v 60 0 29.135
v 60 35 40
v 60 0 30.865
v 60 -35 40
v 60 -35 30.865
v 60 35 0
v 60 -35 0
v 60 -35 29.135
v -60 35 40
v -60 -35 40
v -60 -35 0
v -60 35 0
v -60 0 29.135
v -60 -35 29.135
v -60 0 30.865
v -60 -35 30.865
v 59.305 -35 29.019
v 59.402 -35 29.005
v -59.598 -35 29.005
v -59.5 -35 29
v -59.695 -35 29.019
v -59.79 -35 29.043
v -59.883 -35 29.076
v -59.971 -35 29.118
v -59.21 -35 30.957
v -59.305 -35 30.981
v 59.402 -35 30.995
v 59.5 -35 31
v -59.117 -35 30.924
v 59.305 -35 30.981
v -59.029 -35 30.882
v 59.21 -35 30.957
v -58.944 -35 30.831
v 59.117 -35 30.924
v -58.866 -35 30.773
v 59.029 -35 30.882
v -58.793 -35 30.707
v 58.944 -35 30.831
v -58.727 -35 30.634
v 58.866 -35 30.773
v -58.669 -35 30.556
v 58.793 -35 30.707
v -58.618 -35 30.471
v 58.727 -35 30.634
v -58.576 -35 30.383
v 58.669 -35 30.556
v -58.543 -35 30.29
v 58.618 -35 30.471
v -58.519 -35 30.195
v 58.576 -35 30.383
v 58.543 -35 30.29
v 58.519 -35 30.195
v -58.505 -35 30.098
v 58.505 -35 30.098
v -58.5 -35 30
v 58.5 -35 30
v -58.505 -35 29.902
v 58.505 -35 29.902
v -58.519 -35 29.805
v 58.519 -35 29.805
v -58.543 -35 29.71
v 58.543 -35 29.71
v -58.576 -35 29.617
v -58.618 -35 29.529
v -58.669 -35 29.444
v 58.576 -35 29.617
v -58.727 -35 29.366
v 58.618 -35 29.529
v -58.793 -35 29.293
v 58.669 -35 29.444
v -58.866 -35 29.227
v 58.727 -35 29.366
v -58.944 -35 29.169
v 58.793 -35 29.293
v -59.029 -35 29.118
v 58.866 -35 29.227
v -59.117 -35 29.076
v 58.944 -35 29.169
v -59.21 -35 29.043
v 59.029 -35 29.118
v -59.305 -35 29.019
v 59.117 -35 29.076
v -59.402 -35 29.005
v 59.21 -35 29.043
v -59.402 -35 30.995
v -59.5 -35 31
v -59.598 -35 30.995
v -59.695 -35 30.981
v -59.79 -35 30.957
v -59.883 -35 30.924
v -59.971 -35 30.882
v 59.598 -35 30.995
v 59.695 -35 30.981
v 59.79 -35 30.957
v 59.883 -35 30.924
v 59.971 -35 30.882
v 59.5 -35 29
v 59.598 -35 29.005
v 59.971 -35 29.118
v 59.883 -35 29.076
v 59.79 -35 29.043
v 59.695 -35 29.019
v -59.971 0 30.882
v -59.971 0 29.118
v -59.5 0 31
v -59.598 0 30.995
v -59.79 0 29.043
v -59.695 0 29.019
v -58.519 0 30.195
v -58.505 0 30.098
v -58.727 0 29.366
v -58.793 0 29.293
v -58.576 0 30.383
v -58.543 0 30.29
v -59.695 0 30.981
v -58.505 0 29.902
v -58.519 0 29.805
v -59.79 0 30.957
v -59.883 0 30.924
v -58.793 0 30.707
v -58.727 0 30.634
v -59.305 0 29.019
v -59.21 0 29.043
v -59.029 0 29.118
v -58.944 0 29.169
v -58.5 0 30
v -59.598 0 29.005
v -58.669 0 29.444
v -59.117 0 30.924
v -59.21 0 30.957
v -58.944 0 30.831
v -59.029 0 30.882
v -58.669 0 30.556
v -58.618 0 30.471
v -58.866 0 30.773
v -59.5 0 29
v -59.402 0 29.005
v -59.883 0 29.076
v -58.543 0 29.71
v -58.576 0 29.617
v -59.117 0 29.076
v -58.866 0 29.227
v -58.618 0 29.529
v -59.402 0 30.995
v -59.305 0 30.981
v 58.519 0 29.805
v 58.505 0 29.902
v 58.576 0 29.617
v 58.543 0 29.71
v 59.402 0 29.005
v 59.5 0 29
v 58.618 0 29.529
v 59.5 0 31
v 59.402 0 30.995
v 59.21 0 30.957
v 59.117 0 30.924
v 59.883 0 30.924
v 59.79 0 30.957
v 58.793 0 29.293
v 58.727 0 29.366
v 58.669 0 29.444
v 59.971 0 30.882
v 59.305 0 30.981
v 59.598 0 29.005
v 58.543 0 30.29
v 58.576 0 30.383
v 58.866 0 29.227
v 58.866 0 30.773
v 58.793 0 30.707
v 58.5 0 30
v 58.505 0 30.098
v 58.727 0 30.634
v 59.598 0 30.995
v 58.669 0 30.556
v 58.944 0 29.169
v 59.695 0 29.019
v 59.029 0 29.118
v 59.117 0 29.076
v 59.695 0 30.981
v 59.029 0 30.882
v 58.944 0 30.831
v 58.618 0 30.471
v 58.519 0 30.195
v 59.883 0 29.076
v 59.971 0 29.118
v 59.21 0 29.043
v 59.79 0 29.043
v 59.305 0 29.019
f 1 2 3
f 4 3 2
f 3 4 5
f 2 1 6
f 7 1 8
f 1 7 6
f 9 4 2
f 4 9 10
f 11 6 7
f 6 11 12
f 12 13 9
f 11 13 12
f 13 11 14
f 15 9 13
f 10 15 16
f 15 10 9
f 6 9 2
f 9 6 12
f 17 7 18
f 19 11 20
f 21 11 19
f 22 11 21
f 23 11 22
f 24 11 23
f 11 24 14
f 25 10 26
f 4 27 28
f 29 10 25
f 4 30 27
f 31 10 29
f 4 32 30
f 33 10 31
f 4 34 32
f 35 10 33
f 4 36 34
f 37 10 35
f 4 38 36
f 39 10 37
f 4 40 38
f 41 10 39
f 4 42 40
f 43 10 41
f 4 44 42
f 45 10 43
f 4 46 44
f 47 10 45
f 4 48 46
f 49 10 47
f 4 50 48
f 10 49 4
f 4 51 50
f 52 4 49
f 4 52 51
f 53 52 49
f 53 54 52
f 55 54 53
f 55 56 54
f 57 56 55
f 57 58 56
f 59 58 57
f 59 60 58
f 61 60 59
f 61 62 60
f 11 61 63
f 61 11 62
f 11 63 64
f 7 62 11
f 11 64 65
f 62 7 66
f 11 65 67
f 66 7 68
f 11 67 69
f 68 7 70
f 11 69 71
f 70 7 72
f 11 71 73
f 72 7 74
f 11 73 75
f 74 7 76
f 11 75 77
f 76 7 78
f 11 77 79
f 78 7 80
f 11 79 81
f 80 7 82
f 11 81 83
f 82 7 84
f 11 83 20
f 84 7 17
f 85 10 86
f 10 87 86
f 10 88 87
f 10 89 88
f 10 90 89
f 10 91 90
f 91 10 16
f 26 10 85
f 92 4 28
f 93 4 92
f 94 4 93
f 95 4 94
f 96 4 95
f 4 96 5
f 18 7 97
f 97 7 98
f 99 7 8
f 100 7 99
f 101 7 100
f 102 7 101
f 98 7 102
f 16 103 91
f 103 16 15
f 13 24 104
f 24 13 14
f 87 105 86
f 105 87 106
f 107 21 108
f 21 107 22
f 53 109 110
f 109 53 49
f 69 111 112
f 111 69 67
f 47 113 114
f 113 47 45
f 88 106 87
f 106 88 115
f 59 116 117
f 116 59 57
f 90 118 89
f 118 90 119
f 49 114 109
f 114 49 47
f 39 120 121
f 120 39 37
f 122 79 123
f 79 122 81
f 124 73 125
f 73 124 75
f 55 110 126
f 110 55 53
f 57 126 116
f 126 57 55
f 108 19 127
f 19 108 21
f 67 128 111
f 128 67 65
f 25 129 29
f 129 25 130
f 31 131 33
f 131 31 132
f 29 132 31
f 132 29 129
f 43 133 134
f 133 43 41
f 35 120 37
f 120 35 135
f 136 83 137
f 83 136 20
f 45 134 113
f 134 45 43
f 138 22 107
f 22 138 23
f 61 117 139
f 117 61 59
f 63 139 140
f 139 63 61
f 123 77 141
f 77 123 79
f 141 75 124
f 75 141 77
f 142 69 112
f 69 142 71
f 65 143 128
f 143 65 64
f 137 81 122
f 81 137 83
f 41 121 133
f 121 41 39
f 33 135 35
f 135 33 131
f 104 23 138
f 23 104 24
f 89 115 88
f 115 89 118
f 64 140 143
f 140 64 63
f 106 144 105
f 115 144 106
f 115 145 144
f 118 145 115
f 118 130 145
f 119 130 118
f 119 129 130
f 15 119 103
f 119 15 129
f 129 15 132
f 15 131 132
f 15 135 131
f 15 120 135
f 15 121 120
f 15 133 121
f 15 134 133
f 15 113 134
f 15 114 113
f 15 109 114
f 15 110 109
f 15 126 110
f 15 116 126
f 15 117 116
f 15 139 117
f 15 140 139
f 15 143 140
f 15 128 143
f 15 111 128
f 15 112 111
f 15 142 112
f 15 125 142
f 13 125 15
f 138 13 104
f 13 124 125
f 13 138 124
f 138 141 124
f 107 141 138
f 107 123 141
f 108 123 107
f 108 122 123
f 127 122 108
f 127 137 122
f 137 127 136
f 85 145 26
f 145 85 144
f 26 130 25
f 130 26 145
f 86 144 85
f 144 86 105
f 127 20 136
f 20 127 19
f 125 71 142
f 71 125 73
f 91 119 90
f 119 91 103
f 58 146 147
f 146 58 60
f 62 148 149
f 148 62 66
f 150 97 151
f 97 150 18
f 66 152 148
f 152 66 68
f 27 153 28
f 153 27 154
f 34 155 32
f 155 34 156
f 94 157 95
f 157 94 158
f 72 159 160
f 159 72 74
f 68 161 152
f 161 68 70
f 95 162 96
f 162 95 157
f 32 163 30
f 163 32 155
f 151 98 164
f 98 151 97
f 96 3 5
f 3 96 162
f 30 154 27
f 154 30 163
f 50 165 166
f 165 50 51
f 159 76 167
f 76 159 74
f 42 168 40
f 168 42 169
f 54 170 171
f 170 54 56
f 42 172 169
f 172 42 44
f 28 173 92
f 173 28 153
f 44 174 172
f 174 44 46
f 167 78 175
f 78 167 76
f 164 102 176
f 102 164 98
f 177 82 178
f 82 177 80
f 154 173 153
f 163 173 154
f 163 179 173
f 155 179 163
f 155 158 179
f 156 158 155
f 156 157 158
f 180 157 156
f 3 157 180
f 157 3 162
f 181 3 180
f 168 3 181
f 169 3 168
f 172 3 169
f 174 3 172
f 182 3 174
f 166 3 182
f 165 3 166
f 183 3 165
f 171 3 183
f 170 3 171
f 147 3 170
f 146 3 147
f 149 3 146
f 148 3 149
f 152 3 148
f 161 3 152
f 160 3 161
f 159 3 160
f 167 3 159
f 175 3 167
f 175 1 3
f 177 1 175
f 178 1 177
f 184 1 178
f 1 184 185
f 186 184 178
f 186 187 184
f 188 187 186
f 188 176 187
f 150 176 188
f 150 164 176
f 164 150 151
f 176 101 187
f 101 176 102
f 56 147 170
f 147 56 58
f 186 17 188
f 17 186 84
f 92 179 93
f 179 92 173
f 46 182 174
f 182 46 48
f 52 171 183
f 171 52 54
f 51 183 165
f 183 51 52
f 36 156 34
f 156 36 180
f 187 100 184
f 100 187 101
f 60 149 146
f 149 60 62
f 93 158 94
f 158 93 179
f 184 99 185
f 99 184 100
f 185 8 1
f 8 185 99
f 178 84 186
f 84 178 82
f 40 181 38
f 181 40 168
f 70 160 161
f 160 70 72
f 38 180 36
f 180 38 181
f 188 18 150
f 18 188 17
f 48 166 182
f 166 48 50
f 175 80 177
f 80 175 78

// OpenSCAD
// Mini horizontal gel-electrophoresis box - buffer tank
// Print orientation: base on XY plane, open top at z = 40

// ---------- Parameters ----------
outer_x      = 120;  // outer length in X
outer_y      = 70;   // outer width in Y
tank_h       = 40;   // overall height in Z
wall         = 3;    // wall thickness
floor        = 3;    // floor thickness (bottom slab)

platform_x   = 60;   // platform length in X (centred)
platform_y   = 70;   // platform width in Y (full inner width)
platform_top = 13;   // top of platform, 10 mm above inner floor

hole_d       = 2;    // electrode wire hole diameter
hole_y       = 0;    // hole centre in Y
hole_z       = 30;   // hole centre in Z

eps          = 0.5;  // cutter overshoot

$fn = 64;

// ---------- Derived ----------
inner_w = outer_y - 2 * wall;  // inner width (Y)
// platform height from tank floor
ph = platform_top - floor;

// ---------- Model ----------
difference() {
    union() {
        // Tank body
        translate([-outer_x / 2, -outer_y / 2, 0])
            cube([outer_x, outer_y, tank_h]);

        // Raised platform
        translate([-platform_x / 2, -platform_y / 2, floor])
            cube([platform_x, platform_y, ph]);
    }

    // Electrode holes through end walls, along X
    for (sx = [-1, 1])
        translate([sx * (outer_x / 2 - eps), hole_y, hole_z])
            rotate([90, 0, 0])
                cylinder(d = hole_d, h = tank_h + 2 * eps);
}
